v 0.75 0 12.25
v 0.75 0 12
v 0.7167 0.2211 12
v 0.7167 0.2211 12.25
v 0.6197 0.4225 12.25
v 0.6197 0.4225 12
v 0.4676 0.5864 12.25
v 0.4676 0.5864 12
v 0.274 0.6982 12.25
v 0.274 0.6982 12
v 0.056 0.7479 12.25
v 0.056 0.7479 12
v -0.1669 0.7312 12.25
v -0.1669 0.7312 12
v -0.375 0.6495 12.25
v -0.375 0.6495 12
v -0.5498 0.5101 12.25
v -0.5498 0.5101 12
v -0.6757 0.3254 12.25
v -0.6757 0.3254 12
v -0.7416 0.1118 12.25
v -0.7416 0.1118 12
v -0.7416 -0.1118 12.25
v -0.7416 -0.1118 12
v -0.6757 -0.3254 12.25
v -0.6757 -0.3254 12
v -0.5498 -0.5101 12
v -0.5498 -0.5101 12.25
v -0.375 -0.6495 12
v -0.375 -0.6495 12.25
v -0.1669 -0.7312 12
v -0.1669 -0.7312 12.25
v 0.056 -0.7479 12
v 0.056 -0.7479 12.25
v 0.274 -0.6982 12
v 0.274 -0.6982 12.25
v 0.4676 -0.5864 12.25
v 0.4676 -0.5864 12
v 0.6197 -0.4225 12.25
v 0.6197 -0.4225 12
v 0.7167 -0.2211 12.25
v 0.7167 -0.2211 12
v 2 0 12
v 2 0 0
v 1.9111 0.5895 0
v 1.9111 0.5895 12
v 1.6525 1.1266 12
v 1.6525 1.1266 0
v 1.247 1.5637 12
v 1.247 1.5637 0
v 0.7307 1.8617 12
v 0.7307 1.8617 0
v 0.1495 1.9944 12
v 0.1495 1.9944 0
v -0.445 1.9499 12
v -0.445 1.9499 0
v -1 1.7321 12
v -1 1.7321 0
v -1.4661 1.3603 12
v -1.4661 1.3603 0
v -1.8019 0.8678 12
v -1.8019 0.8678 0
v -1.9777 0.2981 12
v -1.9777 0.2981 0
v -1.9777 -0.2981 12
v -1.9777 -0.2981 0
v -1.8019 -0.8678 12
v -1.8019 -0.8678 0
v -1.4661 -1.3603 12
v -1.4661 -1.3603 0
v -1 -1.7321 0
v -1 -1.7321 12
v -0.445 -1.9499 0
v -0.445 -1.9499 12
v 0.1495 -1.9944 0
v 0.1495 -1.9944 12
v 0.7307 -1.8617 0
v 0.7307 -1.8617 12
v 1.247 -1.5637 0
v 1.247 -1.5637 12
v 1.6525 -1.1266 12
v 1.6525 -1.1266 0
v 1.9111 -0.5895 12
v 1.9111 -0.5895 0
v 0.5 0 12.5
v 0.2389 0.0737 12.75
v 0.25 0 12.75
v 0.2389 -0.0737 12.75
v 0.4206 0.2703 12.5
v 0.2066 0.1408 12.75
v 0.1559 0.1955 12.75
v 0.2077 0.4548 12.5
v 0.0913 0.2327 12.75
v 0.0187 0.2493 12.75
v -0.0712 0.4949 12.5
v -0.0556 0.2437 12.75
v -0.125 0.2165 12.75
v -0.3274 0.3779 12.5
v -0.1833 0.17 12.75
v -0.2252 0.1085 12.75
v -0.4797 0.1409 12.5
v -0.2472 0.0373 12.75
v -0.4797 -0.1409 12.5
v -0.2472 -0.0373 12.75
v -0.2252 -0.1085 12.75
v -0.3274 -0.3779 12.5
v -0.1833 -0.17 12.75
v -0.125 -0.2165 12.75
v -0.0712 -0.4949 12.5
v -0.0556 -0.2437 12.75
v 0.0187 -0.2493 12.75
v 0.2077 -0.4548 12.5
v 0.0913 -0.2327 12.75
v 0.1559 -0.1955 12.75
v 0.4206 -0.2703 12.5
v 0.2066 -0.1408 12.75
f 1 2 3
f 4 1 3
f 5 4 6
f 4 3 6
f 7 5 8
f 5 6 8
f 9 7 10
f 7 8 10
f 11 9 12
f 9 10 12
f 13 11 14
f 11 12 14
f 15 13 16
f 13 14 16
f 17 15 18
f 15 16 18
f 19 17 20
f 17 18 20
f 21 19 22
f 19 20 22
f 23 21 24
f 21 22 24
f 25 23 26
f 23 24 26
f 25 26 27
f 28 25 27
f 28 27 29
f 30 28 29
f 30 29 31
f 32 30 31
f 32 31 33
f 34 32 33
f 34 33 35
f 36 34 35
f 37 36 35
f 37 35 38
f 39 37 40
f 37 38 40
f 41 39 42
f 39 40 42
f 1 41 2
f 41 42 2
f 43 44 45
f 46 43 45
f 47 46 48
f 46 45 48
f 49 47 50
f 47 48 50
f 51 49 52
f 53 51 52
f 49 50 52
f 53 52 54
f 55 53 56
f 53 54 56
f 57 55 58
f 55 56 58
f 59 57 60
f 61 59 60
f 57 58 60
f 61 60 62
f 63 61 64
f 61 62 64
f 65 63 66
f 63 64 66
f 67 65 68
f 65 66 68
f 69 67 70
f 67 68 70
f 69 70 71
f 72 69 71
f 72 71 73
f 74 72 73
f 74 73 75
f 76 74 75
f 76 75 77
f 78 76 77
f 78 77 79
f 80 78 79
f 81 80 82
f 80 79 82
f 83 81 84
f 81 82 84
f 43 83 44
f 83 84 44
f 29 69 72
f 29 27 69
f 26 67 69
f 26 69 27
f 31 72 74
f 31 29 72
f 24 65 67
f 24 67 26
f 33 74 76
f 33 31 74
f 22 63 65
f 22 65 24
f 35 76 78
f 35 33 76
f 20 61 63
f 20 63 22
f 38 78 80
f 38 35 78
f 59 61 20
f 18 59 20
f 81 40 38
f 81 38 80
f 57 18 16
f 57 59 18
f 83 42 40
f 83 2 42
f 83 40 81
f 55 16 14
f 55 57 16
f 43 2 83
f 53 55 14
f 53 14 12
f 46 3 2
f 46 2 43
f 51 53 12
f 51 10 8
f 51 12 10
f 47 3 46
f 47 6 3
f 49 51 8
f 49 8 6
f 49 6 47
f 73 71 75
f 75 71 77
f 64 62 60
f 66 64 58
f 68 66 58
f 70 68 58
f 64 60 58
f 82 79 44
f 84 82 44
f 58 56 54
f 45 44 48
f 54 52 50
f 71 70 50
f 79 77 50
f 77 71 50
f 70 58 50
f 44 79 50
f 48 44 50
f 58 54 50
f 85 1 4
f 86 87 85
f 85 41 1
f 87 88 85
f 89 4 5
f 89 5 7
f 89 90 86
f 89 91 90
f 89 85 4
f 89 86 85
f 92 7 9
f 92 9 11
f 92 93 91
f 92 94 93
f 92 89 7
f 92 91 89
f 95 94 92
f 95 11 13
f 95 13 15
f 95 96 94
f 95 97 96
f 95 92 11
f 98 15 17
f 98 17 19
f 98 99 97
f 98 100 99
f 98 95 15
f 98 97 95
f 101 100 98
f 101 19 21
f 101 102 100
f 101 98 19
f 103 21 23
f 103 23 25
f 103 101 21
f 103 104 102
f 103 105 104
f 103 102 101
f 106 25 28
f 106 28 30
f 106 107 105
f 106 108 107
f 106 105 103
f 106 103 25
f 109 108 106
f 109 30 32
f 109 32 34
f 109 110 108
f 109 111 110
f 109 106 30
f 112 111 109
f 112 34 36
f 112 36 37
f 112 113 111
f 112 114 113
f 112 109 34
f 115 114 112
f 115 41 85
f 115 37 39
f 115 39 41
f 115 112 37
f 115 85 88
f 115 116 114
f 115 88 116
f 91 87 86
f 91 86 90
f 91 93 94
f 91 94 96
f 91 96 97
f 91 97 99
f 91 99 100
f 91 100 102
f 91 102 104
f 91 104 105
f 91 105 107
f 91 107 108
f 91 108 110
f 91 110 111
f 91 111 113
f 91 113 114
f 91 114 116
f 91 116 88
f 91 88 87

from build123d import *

# Parameters (mm, degrees)
SKETCH002_R     = 2
PAD003_DEPTH    = 12
SKETCH003_R     = 0.75
PAD004_DEPTH    = 0.75
CHAMFER001_SIZE = 0.5


with BuildPart() as part:
    # Sketch002 → Pad003 (new body)
    with BuildSketch(Plane.XY):
        Circle(SKETCH002_R)
    extrude(amount=PAD003_DEPTH)

    # Sketch003 (on Face3 of Pad003) → Pad004 (join)
    with BuildSketch(Plane.XY.offset(12)):
        Circle(SKETCH003_R)
    extrude(amount=PAD004_DEPTH)

    # Chamfer001
    chamfer001_edges = [part.edges().sort_by_distance(p)[0] for p in [
        (-0.75, 0, 12.75),
    ]]
    chamfer(chamfer001_edges, length=CHAMFER001_SIZE)


solid = part.part
